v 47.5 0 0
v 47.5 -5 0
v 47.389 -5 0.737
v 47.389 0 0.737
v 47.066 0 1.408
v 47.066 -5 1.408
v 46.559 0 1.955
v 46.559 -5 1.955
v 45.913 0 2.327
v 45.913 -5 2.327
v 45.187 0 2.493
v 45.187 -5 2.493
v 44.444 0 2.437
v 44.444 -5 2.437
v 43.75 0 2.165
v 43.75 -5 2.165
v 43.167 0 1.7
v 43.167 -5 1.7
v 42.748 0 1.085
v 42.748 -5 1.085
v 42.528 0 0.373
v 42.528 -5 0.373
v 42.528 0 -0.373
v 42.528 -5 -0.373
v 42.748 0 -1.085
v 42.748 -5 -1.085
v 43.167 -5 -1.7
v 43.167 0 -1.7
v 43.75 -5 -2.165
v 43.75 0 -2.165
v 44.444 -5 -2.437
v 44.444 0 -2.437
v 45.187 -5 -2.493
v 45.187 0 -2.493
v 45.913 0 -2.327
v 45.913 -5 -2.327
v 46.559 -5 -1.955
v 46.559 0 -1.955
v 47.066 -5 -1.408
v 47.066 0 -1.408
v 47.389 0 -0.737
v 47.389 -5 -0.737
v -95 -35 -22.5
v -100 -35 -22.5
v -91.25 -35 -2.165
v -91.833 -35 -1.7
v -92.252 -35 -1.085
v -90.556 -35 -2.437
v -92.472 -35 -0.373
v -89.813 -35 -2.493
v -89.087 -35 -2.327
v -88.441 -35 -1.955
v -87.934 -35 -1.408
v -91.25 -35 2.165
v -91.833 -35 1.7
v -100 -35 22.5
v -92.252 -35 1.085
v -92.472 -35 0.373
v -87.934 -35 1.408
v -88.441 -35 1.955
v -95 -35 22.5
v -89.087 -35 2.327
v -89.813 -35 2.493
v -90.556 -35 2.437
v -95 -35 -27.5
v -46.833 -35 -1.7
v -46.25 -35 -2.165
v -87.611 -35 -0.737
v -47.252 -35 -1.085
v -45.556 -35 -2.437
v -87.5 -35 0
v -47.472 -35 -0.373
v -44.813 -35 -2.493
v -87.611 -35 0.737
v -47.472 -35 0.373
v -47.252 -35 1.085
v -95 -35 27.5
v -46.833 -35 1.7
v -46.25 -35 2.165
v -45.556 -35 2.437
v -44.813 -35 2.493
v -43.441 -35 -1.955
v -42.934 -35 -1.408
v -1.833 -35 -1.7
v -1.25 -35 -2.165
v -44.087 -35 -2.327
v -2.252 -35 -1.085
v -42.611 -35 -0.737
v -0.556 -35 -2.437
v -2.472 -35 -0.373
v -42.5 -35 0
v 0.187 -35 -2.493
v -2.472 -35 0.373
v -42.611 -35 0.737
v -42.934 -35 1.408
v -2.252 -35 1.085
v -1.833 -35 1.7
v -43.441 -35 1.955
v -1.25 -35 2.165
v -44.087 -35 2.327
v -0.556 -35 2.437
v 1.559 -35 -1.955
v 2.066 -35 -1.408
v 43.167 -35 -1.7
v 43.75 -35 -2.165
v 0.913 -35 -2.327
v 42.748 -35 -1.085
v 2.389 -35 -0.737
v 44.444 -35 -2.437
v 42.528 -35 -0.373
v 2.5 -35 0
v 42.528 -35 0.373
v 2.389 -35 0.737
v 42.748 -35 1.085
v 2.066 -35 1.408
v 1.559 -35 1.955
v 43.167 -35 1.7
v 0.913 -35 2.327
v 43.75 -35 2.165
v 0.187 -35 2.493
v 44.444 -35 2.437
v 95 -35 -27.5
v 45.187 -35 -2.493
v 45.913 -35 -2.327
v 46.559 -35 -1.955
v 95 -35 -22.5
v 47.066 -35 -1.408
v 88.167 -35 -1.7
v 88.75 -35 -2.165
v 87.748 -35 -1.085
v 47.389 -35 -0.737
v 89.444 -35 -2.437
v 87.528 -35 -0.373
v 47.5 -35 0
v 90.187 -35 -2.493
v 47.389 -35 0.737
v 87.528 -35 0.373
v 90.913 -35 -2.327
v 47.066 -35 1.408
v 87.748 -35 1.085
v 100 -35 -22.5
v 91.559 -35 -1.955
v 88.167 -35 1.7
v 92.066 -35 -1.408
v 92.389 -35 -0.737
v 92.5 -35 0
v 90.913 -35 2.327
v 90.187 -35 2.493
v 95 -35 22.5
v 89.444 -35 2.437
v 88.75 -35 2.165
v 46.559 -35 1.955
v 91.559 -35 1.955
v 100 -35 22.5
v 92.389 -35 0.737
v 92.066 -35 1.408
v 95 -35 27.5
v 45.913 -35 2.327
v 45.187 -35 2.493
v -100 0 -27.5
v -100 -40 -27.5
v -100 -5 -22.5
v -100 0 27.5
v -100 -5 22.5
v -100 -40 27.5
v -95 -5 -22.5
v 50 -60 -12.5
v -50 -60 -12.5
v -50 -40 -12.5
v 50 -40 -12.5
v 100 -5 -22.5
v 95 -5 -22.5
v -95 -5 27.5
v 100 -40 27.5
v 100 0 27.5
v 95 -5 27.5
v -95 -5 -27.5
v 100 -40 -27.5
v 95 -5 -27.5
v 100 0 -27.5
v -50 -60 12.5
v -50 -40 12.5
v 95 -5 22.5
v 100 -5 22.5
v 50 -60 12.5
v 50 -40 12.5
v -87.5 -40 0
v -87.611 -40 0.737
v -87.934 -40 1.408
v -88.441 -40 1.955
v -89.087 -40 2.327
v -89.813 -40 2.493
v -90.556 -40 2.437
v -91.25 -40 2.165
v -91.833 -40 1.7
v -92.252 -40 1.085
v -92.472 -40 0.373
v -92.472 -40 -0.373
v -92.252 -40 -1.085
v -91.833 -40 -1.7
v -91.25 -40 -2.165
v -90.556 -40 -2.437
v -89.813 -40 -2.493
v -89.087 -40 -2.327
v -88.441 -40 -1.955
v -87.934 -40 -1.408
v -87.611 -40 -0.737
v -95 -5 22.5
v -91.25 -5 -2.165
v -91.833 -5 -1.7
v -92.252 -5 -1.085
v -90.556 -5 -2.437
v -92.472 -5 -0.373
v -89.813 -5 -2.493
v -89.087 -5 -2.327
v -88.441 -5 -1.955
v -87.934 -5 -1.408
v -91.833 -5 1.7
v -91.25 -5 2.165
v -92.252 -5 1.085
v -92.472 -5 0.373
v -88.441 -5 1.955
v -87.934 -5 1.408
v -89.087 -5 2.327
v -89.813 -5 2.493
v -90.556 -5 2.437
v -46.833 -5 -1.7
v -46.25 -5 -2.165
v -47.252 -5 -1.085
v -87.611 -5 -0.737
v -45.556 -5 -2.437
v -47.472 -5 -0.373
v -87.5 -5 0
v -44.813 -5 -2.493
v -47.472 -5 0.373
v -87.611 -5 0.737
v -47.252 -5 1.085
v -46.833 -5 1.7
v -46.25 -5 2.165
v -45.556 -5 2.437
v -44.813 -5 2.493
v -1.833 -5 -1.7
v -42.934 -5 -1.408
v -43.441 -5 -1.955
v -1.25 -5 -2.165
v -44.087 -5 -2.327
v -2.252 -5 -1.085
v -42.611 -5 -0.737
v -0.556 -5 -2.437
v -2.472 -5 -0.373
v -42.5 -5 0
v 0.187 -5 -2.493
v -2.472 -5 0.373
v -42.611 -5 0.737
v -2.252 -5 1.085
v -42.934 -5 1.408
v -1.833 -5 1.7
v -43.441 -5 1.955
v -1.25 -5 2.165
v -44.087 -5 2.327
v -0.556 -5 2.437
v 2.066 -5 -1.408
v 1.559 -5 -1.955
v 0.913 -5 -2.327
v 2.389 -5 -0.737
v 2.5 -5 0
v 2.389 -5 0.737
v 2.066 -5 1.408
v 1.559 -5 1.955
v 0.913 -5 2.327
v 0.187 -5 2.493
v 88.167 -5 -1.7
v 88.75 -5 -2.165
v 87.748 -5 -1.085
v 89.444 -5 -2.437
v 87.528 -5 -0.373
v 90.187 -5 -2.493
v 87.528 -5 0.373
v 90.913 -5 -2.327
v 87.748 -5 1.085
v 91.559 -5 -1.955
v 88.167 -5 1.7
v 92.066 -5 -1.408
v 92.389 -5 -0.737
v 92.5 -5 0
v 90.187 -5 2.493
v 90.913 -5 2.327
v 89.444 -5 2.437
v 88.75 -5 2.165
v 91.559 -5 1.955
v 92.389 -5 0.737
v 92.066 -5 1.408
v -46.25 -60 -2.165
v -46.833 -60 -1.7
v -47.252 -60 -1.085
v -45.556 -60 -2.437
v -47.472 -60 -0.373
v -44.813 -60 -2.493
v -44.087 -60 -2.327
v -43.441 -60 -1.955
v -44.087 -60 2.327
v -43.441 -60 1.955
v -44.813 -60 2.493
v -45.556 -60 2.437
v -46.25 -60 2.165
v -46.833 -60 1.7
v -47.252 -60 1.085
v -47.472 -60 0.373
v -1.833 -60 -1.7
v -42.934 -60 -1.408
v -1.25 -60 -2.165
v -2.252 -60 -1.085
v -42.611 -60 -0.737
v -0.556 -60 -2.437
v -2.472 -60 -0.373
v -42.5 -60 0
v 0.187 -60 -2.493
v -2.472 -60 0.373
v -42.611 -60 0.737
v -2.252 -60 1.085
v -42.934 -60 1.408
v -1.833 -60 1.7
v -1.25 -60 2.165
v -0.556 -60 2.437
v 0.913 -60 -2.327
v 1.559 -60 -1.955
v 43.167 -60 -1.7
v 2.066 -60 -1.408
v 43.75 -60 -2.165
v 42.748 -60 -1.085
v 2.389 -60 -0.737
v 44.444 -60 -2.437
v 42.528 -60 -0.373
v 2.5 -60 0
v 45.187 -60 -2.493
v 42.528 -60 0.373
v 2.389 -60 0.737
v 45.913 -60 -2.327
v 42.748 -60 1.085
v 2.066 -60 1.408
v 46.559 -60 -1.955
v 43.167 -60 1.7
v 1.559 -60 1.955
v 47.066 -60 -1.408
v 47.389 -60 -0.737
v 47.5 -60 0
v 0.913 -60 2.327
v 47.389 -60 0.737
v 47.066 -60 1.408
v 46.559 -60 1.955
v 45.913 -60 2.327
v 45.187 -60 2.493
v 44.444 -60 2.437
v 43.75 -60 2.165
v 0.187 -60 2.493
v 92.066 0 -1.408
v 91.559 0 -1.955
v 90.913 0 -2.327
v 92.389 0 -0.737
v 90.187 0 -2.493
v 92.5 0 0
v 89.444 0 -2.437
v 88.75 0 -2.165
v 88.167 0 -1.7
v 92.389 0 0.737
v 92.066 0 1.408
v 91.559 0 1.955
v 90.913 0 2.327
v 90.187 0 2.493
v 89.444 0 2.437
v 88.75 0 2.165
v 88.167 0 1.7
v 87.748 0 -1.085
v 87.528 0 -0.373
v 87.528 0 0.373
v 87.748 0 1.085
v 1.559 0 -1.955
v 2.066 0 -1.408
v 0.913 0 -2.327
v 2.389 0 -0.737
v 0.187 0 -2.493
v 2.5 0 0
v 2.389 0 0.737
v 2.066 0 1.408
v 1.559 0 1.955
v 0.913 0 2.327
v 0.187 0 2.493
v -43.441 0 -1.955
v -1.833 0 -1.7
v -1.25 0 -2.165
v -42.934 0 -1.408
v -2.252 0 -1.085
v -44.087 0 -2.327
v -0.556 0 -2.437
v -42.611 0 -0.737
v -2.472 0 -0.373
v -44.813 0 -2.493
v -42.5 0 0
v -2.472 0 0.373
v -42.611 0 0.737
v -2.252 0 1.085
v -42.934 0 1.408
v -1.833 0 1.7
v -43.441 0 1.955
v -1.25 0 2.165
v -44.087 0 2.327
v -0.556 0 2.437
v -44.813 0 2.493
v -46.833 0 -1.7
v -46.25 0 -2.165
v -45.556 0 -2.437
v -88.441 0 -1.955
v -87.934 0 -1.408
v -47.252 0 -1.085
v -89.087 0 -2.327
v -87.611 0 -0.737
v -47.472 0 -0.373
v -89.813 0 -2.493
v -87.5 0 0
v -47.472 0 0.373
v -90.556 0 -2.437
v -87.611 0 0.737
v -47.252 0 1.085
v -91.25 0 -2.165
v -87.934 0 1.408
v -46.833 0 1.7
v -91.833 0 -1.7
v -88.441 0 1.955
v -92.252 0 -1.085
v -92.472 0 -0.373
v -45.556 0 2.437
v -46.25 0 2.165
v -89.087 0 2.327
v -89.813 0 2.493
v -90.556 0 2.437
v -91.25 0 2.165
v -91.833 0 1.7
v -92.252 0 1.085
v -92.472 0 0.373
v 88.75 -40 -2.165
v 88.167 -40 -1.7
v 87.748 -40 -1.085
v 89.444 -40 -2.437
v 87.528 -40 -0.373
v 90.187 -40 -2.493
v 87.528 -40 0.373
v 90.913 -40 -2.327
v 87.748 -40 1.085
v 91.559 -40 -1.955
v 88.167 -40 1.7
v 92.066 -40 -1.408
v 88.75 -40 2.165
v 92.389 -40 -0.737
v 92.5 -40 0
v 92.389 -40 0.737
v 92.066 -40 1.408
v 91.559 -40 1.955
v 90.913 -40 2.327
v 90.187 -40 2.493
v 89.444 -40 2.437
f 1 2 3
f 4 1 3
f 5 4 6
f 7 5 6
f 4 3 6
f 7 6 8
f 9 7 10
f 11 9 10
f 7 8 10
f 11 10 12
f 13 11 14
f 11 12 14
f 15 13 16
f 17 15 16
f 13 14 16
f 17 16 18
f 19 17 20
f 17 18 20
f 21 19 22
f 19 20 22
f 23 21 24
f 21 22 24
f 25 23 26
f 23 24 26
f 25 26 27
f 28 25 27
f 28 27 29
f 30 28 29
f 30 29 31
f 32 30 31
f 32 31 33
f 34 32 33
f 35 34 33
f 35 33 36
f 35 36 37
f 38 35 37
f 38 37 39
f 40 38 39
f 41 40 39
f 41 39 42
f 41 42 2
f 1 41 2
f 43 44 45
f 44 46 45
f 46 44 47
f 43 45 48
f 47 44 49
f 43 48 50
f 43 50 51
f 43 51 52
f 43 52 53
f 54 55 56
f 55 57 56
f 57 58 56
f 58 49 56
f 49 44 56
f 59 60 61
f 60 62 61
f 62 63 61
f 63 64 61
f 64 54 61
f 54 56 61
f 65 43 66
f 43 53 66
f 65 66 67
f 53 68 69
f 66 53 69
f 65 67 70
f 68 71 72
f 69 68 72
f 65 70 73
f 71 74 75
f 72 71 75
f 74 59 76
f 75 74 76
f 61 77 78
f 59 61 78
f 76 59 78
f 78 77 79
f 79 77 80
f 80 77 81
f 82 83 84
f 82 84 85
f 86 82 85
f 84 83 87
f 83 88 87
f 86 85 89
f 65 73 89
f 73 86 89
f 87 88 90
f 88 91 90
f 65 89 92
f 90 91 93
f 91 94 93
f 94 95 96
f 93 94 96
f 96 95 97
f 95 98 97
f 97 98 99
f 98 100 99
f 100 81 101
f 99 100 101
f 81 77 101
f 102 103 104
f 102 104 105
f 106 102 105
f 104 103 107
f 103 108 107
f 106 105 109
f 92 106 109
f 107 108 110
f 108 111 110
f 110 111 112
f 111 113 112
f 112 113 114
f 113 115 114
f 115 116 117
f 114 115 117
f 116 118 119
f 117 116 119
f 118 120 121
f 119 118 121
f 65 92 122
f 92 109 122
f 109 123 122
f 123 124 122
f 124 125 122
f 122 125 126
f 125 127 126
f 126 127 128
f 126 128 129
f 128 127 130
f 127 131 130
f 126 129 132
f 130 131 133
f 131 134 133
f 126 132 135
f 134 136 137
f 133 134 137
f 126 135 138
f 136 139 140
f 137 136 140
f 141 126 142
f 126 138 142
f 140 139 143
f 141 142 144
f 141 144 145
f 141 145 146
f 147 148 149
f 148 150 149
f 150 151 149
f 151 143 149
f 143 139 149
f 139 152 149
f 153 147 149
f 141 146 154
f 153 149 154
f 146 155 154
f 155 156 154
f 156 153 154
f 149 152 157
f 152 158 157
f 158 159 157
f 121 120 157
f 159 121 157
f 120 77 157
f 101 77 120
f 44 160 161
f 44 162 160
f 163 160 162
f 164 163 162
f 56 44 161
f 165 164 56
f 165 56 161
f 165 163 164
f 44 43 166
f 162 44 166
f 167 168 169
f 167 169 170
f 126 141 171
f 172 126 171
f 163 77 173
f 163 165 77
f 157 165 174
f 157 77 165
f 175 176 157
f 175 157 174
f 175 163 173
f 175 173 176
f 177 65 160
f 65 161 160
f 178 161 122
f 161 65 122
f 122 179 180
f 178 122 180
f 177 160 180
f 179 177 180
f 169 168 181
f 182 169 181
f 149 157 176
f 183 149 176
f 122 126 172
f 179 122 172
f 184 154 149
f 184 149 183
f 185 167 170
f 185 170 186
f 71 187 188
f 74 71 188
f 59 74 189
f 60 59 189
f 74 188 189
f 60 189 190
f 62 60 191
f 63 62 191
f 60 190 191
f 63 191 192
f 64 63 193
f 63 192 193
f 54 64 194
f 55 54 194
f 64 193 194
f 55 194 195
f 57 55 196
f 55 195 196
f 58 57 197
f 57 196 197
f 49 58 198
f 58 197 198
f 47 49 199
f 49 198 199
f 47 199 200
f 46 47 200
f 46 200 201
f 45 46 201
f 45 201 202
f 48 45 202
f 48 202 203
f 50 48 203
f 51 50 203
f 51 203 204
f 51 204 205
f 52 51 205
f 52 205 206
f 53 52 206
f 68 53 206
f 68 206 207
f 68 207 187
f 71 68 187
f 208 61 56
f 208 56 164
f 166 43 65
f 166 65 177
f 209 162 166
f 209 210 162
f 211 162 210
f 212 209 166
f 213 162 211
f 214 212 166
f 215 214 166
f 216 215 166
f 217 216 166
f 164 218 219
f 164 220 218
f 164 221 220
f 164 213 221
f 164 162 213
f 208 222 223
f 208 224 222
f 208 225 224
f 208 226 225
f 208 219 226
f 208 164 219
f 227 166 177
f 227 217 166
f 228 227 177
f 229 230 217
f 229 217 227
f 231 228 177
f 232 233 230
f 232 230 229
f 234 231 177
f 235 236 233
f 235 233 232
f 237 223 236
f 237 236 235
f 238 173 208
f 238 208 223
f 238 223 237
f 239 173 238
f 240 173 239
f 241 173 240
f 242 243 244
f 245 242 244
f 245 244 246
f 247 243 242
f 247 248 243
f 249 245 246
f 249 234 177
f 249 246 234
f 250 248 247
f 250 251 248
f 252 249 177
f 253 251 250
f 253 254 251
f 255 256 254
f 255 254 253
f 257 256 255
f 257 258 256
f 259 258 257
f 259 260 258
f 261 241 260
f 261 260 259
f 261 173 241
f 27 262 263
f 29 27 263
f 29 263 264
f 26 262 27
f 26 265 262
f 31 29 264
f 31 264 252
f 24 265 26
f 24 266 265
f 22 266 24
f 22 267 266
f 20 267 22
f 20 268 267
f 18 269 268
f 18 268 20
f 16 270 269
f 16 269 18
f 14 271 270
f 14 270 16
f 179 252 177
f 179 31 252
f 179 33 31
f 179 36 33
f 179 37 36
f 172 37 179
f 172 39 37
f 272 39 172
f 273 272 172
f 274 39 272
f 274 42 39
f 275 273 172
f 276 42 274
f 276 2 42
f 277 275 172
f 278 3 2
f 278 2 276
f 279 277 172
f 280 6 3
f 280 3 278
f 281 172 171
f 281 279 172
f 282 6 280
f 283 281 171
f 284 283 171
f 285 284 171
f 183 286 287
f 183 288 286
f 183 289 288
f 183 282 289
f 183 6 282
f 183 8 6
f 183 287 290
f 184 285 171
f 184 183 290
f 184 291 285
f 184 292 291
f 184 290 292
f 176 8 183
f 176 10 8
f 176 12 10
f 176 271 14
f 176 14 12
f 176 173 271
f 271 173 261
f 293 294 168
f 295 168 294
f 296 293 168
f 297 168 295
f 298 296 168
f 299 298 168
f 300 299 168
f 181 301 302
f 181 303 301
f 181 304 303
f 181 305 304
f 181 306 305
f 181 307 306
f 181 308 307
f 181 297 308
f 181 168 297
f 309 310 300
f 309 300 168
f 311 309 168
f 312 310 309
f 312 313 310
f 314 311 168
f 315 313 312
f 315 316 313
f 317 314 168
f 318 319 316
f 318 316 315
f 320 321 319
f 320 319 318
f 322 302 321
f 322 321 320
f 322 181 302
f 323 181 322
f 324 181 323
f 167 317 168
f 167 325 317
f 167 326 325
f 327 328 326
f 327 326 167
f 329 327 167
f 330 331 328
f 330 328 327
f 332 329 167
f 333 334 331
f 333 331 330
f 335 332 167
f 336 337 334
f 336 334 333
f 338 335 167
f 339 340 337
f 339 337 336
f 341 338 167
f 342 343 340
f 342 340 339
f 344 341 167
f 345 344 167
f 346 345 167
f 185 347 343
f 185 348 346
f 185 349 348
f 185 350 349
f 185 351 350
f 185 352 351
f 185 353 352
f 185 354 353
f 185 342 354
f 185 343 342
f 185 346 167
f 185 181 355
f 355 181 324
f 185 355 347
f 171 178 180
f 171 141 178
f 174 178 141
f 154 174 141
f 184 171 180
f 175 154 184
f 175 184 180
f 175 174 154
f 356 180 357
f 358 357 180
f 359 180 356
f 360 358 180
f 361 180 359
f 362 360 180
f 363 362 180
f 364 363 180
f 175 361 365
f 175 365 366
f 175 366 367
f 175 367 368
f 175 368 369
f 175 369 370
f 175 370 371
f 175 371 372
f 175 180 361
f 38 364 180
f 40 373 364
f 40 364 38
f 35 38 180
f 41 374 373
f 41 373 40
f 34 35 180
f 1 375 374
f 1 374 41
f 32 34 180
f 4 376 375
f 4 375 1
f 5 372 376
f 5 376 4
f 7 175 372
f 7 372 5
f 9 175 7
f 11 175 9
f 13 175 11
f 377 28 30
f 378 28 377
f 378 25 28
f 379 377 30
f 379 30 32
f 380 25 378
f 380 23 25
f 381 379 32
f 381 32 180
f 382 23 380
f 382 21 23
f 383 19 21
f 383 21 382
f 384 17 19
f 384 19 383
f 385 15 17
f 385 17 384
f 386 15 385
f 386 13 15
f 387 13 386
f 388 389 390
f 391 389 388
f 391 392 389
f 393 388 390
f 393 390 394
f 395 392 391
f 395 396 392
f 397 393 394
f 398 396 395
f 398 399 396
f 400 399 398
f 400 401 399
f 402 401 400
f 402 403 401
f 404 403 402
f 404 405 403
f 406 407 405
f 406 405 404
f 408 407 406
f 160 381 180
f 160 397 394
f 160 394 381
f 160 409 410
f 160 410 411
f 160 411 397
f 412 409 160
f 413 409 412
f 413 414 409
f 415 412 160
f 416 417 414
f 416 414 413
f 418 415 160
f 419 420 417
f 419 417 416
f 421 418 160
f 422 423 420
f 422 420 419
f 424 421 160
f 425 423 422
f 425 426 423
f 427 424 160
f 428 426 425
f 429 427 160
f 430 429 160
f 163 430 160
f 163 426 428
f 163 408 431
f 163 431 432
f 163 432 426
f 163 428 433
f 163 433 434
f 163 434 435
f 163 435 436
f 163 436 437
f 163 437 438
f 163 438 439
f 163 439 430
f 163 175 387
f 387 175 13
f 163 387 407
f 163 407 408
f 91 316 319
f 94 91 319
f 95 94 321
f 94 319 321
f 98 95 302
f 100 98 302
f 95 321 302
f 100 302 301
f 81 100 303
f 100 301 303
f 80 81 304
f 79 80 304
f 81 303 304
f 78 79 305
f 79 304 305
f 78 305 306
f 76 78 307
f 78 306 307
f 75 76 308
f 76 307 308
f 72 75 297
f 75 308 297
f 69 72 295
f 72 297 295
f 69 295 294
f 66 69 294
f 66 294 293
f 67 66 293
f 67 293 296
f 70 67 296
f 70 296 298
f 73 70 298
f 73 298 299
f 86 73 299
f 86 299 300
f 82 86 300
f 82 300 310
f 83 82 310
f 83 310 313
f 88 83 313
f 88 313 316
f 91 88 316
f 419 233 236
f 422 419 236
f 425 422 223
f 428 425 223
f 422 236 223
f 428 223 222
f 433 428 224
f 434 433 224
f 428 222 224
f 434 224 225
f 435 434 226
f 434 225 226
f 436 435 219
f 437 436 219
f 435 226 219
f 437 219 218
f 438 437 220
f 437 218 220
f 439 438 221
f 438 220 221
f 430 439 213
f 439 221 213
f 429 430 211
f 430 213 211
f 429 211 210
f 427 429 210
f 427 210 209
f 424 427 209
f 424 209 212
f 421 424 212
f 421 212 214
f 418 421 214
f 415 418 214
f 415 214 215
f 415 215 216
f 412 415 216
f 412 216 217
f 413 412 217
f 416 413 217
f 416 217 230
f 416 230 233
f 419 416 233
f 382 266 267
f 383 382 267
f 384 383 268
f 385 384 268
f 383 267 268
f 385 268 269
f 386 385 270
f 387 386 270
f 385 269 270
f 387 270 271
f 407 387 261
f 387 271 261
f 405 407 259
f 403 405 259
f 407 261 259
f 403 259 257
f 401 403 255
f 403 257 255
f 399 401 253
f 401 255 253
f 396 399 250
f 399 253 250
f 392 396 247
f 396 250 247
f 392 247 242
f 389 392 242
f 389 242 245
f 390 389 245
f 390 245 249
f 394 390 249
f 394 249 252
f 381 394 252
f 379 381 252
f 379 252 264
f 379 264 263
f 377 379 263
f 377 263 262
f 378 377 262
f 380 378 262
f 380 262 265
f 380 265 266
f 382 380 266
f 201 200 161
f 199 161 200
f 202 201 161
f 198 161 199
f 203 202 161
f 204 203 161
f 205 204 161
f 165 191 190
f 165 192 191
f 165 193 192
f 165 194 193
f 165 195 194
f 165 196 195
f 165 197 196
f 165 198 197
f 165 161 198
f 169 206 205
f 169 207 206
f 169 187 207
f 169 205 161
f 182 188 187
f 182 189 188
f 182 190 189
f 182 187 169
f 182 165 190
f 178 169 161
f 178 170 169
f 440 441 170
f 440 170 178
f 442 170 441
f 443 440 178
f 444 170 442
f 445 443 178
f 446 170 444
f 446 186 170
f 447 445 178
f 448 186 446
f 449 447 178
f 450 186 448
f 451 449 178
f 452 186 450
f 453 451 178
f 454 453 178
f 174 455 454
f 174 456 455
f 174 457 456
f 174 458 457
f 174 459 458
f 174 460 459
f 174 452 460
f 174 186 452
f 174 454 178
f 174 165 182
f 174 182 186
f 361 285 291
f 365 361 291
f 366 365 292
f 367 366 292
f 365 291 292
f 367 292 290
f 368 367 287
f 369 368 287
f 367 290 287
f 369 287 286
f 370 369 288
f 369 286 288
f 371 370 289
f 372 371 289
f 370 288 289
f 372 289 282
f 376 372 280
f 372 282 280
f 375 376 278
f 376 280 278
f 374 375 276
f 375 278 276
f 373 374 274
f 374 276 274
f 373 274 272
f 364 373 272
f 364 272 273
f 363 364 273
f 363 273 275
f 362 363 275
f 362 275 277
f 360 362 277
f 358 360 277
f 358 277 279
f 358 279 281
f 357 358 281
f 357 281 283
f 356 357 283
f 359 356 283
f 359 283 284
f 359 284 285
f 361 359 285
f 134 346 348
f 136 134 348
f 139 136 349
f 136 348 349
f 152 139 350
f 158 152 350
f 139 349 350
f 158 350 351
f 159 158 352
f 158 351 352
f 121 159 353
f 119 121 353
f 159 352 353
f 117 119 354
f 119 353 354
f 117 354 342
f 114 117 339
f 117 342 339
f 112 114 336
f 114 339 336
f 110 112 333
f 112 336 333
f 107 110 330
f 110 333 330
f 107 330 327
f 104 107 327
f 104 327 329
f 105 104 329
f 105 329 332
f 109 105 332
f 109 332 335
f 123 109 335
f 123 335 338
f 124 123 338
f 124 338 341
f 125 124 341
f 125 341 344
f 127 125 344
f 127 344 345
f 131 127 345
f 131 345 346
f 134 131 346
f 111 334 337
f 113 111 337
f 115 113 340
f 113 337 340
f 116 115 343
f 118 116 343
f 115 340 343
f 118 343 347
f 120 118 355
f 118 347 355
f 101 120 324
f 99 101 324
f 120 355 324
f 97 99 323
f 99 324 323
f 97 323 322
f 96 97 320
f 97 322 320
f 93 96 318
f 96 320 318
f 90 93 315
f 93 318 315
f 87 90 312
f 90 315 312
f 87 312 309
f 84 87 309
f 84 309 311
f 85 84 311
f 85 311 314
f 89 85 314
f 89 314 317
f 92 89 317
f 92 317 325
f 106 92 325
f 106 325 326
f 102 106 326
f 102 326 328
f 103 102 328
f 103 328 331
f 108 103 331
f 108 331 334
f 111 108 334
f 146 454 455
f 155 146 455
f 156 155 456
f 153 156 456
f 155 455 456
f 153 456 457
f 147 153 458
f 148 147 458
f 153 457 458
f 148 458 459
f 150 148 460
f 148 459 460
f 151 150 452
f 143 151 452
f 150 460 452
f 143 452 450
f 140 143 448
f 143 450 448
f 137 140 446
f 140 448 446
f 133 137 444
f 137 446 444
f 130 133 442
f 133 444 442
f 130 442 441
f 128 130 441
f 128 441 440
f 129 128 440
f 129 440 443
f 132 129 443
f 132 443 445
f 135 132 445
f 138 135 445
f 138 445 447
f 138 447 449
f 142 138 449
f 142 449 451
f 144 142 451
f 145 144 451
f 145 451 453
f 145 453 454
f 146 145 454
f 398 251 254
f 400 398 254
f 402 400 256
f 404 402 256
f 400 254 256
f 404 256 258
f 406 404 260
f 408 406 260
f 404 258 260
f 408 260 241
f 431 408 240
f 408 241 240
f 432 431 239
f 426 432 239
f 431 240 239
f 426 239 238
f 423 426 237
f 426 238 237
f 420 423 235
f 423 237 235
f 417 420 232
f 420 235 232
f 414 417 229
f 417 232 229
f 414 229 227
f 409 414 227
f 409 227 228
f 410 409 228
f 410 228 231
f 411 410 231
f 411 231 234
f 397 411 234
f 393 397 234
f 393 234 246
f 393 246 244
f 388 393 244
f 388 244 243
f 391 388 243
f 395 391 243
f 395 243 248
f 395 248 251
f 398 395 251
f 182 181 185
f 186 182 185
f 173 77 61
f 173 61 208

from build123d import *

# Parameters (mm, degrees)
F0_W      = 100
F0_H      = 20
F1_DEPTH  = 27.5
F2_W      = 190
F2_H      = 30
F3_DEPTH  = 55.001
F4_W      = 30
F4_H      = 45
F5_DEPTH  = 500
F6_R      = 2.5
F7_DEPTH  = 40.001
F8_R      = 2.5
F9_DEPTH  = 60.001
F10_R     = 2.5
F11_DEPTH = 60.001
F12_W     = 145.98173
F12_H     = 84.634348
F12_W_2   = 100
F12_H_2   = 25
F13_DEPTH = 20


with BuildPart() as f1:
    # F0 (on Top) → F1 (new body, symmetric)
    with BuildSketch(Plane.XY):
        Polygon((100, 0), (-100, 0), (-100, -40), (-50, -40), (50, -40), (100, -40), align=None)
        with Locations((0, -50)):
            Rectangle(F0_W, F0_H)
    extrude(amount=F1_DEPTH, both=True)

    # F2 (on face) → F3 (cut, through all)
    with BuildSketch(Plane.XY.offset(27.5)):
        with Locations((0, -20)):
            Rectangle(F2_W, F2_H)
    extrude(amount=-F3_DEPTH, mode=Mode.SUBTRACT)

    # F4 (on face) → F5 (cut, symmetric)
    with BuildSketch(Plane.YZ.offset(-95)):
        with Locations((-20, 0)):
            Rectangle(F4_W, F4_H)
    extrude(amount=F5_DEPTH, both=True, mode=Mode.SUBTRACT)

    # F6 (on face) → F7 (cut, through all)
    with BuildSketch(Plane.XZ.offset(40)):
        with Locations((-90, 0)):
            Circle(F6_R)
        with Locations((90, 0)):
            Circle(F6_R)
    extrude(amount=-F7_DEPTH, mode=Mode.SUBTRACT)

    # F8 (on face) → F9 (cut, through all)
    with BuildSketch(Plane.XZ.offset(60)):
        with Locations((-45, 0)):
            Circle(F8_R)
        with Locations((45, 0)):
            Circle(F8_R)
    extrude(amount=-F9_DEPTH, mode=Mode.SUBTRACT)

    # F10 (on face) → F11 (cut, through all)
    with BuildSketch(Plane.XZ.offset(60)):
        Circle(F10_R)
    extrude(amount=-F11_DEPTH, mode=Mode.SUBTRACT)

    # F12 (on face) → F13 (cut, through all)
    with BuildSketch(Plane.XZ.offset(60)):
        Rectangle(F12_W, F12_H)
        Rectangle(F12_W_2, F12_H_2, mode=Mode.SUBTRACT)
    extrude(amount=-F13_DEPTH, mode=Mode.SUBTRACT)


solid = f1.part
